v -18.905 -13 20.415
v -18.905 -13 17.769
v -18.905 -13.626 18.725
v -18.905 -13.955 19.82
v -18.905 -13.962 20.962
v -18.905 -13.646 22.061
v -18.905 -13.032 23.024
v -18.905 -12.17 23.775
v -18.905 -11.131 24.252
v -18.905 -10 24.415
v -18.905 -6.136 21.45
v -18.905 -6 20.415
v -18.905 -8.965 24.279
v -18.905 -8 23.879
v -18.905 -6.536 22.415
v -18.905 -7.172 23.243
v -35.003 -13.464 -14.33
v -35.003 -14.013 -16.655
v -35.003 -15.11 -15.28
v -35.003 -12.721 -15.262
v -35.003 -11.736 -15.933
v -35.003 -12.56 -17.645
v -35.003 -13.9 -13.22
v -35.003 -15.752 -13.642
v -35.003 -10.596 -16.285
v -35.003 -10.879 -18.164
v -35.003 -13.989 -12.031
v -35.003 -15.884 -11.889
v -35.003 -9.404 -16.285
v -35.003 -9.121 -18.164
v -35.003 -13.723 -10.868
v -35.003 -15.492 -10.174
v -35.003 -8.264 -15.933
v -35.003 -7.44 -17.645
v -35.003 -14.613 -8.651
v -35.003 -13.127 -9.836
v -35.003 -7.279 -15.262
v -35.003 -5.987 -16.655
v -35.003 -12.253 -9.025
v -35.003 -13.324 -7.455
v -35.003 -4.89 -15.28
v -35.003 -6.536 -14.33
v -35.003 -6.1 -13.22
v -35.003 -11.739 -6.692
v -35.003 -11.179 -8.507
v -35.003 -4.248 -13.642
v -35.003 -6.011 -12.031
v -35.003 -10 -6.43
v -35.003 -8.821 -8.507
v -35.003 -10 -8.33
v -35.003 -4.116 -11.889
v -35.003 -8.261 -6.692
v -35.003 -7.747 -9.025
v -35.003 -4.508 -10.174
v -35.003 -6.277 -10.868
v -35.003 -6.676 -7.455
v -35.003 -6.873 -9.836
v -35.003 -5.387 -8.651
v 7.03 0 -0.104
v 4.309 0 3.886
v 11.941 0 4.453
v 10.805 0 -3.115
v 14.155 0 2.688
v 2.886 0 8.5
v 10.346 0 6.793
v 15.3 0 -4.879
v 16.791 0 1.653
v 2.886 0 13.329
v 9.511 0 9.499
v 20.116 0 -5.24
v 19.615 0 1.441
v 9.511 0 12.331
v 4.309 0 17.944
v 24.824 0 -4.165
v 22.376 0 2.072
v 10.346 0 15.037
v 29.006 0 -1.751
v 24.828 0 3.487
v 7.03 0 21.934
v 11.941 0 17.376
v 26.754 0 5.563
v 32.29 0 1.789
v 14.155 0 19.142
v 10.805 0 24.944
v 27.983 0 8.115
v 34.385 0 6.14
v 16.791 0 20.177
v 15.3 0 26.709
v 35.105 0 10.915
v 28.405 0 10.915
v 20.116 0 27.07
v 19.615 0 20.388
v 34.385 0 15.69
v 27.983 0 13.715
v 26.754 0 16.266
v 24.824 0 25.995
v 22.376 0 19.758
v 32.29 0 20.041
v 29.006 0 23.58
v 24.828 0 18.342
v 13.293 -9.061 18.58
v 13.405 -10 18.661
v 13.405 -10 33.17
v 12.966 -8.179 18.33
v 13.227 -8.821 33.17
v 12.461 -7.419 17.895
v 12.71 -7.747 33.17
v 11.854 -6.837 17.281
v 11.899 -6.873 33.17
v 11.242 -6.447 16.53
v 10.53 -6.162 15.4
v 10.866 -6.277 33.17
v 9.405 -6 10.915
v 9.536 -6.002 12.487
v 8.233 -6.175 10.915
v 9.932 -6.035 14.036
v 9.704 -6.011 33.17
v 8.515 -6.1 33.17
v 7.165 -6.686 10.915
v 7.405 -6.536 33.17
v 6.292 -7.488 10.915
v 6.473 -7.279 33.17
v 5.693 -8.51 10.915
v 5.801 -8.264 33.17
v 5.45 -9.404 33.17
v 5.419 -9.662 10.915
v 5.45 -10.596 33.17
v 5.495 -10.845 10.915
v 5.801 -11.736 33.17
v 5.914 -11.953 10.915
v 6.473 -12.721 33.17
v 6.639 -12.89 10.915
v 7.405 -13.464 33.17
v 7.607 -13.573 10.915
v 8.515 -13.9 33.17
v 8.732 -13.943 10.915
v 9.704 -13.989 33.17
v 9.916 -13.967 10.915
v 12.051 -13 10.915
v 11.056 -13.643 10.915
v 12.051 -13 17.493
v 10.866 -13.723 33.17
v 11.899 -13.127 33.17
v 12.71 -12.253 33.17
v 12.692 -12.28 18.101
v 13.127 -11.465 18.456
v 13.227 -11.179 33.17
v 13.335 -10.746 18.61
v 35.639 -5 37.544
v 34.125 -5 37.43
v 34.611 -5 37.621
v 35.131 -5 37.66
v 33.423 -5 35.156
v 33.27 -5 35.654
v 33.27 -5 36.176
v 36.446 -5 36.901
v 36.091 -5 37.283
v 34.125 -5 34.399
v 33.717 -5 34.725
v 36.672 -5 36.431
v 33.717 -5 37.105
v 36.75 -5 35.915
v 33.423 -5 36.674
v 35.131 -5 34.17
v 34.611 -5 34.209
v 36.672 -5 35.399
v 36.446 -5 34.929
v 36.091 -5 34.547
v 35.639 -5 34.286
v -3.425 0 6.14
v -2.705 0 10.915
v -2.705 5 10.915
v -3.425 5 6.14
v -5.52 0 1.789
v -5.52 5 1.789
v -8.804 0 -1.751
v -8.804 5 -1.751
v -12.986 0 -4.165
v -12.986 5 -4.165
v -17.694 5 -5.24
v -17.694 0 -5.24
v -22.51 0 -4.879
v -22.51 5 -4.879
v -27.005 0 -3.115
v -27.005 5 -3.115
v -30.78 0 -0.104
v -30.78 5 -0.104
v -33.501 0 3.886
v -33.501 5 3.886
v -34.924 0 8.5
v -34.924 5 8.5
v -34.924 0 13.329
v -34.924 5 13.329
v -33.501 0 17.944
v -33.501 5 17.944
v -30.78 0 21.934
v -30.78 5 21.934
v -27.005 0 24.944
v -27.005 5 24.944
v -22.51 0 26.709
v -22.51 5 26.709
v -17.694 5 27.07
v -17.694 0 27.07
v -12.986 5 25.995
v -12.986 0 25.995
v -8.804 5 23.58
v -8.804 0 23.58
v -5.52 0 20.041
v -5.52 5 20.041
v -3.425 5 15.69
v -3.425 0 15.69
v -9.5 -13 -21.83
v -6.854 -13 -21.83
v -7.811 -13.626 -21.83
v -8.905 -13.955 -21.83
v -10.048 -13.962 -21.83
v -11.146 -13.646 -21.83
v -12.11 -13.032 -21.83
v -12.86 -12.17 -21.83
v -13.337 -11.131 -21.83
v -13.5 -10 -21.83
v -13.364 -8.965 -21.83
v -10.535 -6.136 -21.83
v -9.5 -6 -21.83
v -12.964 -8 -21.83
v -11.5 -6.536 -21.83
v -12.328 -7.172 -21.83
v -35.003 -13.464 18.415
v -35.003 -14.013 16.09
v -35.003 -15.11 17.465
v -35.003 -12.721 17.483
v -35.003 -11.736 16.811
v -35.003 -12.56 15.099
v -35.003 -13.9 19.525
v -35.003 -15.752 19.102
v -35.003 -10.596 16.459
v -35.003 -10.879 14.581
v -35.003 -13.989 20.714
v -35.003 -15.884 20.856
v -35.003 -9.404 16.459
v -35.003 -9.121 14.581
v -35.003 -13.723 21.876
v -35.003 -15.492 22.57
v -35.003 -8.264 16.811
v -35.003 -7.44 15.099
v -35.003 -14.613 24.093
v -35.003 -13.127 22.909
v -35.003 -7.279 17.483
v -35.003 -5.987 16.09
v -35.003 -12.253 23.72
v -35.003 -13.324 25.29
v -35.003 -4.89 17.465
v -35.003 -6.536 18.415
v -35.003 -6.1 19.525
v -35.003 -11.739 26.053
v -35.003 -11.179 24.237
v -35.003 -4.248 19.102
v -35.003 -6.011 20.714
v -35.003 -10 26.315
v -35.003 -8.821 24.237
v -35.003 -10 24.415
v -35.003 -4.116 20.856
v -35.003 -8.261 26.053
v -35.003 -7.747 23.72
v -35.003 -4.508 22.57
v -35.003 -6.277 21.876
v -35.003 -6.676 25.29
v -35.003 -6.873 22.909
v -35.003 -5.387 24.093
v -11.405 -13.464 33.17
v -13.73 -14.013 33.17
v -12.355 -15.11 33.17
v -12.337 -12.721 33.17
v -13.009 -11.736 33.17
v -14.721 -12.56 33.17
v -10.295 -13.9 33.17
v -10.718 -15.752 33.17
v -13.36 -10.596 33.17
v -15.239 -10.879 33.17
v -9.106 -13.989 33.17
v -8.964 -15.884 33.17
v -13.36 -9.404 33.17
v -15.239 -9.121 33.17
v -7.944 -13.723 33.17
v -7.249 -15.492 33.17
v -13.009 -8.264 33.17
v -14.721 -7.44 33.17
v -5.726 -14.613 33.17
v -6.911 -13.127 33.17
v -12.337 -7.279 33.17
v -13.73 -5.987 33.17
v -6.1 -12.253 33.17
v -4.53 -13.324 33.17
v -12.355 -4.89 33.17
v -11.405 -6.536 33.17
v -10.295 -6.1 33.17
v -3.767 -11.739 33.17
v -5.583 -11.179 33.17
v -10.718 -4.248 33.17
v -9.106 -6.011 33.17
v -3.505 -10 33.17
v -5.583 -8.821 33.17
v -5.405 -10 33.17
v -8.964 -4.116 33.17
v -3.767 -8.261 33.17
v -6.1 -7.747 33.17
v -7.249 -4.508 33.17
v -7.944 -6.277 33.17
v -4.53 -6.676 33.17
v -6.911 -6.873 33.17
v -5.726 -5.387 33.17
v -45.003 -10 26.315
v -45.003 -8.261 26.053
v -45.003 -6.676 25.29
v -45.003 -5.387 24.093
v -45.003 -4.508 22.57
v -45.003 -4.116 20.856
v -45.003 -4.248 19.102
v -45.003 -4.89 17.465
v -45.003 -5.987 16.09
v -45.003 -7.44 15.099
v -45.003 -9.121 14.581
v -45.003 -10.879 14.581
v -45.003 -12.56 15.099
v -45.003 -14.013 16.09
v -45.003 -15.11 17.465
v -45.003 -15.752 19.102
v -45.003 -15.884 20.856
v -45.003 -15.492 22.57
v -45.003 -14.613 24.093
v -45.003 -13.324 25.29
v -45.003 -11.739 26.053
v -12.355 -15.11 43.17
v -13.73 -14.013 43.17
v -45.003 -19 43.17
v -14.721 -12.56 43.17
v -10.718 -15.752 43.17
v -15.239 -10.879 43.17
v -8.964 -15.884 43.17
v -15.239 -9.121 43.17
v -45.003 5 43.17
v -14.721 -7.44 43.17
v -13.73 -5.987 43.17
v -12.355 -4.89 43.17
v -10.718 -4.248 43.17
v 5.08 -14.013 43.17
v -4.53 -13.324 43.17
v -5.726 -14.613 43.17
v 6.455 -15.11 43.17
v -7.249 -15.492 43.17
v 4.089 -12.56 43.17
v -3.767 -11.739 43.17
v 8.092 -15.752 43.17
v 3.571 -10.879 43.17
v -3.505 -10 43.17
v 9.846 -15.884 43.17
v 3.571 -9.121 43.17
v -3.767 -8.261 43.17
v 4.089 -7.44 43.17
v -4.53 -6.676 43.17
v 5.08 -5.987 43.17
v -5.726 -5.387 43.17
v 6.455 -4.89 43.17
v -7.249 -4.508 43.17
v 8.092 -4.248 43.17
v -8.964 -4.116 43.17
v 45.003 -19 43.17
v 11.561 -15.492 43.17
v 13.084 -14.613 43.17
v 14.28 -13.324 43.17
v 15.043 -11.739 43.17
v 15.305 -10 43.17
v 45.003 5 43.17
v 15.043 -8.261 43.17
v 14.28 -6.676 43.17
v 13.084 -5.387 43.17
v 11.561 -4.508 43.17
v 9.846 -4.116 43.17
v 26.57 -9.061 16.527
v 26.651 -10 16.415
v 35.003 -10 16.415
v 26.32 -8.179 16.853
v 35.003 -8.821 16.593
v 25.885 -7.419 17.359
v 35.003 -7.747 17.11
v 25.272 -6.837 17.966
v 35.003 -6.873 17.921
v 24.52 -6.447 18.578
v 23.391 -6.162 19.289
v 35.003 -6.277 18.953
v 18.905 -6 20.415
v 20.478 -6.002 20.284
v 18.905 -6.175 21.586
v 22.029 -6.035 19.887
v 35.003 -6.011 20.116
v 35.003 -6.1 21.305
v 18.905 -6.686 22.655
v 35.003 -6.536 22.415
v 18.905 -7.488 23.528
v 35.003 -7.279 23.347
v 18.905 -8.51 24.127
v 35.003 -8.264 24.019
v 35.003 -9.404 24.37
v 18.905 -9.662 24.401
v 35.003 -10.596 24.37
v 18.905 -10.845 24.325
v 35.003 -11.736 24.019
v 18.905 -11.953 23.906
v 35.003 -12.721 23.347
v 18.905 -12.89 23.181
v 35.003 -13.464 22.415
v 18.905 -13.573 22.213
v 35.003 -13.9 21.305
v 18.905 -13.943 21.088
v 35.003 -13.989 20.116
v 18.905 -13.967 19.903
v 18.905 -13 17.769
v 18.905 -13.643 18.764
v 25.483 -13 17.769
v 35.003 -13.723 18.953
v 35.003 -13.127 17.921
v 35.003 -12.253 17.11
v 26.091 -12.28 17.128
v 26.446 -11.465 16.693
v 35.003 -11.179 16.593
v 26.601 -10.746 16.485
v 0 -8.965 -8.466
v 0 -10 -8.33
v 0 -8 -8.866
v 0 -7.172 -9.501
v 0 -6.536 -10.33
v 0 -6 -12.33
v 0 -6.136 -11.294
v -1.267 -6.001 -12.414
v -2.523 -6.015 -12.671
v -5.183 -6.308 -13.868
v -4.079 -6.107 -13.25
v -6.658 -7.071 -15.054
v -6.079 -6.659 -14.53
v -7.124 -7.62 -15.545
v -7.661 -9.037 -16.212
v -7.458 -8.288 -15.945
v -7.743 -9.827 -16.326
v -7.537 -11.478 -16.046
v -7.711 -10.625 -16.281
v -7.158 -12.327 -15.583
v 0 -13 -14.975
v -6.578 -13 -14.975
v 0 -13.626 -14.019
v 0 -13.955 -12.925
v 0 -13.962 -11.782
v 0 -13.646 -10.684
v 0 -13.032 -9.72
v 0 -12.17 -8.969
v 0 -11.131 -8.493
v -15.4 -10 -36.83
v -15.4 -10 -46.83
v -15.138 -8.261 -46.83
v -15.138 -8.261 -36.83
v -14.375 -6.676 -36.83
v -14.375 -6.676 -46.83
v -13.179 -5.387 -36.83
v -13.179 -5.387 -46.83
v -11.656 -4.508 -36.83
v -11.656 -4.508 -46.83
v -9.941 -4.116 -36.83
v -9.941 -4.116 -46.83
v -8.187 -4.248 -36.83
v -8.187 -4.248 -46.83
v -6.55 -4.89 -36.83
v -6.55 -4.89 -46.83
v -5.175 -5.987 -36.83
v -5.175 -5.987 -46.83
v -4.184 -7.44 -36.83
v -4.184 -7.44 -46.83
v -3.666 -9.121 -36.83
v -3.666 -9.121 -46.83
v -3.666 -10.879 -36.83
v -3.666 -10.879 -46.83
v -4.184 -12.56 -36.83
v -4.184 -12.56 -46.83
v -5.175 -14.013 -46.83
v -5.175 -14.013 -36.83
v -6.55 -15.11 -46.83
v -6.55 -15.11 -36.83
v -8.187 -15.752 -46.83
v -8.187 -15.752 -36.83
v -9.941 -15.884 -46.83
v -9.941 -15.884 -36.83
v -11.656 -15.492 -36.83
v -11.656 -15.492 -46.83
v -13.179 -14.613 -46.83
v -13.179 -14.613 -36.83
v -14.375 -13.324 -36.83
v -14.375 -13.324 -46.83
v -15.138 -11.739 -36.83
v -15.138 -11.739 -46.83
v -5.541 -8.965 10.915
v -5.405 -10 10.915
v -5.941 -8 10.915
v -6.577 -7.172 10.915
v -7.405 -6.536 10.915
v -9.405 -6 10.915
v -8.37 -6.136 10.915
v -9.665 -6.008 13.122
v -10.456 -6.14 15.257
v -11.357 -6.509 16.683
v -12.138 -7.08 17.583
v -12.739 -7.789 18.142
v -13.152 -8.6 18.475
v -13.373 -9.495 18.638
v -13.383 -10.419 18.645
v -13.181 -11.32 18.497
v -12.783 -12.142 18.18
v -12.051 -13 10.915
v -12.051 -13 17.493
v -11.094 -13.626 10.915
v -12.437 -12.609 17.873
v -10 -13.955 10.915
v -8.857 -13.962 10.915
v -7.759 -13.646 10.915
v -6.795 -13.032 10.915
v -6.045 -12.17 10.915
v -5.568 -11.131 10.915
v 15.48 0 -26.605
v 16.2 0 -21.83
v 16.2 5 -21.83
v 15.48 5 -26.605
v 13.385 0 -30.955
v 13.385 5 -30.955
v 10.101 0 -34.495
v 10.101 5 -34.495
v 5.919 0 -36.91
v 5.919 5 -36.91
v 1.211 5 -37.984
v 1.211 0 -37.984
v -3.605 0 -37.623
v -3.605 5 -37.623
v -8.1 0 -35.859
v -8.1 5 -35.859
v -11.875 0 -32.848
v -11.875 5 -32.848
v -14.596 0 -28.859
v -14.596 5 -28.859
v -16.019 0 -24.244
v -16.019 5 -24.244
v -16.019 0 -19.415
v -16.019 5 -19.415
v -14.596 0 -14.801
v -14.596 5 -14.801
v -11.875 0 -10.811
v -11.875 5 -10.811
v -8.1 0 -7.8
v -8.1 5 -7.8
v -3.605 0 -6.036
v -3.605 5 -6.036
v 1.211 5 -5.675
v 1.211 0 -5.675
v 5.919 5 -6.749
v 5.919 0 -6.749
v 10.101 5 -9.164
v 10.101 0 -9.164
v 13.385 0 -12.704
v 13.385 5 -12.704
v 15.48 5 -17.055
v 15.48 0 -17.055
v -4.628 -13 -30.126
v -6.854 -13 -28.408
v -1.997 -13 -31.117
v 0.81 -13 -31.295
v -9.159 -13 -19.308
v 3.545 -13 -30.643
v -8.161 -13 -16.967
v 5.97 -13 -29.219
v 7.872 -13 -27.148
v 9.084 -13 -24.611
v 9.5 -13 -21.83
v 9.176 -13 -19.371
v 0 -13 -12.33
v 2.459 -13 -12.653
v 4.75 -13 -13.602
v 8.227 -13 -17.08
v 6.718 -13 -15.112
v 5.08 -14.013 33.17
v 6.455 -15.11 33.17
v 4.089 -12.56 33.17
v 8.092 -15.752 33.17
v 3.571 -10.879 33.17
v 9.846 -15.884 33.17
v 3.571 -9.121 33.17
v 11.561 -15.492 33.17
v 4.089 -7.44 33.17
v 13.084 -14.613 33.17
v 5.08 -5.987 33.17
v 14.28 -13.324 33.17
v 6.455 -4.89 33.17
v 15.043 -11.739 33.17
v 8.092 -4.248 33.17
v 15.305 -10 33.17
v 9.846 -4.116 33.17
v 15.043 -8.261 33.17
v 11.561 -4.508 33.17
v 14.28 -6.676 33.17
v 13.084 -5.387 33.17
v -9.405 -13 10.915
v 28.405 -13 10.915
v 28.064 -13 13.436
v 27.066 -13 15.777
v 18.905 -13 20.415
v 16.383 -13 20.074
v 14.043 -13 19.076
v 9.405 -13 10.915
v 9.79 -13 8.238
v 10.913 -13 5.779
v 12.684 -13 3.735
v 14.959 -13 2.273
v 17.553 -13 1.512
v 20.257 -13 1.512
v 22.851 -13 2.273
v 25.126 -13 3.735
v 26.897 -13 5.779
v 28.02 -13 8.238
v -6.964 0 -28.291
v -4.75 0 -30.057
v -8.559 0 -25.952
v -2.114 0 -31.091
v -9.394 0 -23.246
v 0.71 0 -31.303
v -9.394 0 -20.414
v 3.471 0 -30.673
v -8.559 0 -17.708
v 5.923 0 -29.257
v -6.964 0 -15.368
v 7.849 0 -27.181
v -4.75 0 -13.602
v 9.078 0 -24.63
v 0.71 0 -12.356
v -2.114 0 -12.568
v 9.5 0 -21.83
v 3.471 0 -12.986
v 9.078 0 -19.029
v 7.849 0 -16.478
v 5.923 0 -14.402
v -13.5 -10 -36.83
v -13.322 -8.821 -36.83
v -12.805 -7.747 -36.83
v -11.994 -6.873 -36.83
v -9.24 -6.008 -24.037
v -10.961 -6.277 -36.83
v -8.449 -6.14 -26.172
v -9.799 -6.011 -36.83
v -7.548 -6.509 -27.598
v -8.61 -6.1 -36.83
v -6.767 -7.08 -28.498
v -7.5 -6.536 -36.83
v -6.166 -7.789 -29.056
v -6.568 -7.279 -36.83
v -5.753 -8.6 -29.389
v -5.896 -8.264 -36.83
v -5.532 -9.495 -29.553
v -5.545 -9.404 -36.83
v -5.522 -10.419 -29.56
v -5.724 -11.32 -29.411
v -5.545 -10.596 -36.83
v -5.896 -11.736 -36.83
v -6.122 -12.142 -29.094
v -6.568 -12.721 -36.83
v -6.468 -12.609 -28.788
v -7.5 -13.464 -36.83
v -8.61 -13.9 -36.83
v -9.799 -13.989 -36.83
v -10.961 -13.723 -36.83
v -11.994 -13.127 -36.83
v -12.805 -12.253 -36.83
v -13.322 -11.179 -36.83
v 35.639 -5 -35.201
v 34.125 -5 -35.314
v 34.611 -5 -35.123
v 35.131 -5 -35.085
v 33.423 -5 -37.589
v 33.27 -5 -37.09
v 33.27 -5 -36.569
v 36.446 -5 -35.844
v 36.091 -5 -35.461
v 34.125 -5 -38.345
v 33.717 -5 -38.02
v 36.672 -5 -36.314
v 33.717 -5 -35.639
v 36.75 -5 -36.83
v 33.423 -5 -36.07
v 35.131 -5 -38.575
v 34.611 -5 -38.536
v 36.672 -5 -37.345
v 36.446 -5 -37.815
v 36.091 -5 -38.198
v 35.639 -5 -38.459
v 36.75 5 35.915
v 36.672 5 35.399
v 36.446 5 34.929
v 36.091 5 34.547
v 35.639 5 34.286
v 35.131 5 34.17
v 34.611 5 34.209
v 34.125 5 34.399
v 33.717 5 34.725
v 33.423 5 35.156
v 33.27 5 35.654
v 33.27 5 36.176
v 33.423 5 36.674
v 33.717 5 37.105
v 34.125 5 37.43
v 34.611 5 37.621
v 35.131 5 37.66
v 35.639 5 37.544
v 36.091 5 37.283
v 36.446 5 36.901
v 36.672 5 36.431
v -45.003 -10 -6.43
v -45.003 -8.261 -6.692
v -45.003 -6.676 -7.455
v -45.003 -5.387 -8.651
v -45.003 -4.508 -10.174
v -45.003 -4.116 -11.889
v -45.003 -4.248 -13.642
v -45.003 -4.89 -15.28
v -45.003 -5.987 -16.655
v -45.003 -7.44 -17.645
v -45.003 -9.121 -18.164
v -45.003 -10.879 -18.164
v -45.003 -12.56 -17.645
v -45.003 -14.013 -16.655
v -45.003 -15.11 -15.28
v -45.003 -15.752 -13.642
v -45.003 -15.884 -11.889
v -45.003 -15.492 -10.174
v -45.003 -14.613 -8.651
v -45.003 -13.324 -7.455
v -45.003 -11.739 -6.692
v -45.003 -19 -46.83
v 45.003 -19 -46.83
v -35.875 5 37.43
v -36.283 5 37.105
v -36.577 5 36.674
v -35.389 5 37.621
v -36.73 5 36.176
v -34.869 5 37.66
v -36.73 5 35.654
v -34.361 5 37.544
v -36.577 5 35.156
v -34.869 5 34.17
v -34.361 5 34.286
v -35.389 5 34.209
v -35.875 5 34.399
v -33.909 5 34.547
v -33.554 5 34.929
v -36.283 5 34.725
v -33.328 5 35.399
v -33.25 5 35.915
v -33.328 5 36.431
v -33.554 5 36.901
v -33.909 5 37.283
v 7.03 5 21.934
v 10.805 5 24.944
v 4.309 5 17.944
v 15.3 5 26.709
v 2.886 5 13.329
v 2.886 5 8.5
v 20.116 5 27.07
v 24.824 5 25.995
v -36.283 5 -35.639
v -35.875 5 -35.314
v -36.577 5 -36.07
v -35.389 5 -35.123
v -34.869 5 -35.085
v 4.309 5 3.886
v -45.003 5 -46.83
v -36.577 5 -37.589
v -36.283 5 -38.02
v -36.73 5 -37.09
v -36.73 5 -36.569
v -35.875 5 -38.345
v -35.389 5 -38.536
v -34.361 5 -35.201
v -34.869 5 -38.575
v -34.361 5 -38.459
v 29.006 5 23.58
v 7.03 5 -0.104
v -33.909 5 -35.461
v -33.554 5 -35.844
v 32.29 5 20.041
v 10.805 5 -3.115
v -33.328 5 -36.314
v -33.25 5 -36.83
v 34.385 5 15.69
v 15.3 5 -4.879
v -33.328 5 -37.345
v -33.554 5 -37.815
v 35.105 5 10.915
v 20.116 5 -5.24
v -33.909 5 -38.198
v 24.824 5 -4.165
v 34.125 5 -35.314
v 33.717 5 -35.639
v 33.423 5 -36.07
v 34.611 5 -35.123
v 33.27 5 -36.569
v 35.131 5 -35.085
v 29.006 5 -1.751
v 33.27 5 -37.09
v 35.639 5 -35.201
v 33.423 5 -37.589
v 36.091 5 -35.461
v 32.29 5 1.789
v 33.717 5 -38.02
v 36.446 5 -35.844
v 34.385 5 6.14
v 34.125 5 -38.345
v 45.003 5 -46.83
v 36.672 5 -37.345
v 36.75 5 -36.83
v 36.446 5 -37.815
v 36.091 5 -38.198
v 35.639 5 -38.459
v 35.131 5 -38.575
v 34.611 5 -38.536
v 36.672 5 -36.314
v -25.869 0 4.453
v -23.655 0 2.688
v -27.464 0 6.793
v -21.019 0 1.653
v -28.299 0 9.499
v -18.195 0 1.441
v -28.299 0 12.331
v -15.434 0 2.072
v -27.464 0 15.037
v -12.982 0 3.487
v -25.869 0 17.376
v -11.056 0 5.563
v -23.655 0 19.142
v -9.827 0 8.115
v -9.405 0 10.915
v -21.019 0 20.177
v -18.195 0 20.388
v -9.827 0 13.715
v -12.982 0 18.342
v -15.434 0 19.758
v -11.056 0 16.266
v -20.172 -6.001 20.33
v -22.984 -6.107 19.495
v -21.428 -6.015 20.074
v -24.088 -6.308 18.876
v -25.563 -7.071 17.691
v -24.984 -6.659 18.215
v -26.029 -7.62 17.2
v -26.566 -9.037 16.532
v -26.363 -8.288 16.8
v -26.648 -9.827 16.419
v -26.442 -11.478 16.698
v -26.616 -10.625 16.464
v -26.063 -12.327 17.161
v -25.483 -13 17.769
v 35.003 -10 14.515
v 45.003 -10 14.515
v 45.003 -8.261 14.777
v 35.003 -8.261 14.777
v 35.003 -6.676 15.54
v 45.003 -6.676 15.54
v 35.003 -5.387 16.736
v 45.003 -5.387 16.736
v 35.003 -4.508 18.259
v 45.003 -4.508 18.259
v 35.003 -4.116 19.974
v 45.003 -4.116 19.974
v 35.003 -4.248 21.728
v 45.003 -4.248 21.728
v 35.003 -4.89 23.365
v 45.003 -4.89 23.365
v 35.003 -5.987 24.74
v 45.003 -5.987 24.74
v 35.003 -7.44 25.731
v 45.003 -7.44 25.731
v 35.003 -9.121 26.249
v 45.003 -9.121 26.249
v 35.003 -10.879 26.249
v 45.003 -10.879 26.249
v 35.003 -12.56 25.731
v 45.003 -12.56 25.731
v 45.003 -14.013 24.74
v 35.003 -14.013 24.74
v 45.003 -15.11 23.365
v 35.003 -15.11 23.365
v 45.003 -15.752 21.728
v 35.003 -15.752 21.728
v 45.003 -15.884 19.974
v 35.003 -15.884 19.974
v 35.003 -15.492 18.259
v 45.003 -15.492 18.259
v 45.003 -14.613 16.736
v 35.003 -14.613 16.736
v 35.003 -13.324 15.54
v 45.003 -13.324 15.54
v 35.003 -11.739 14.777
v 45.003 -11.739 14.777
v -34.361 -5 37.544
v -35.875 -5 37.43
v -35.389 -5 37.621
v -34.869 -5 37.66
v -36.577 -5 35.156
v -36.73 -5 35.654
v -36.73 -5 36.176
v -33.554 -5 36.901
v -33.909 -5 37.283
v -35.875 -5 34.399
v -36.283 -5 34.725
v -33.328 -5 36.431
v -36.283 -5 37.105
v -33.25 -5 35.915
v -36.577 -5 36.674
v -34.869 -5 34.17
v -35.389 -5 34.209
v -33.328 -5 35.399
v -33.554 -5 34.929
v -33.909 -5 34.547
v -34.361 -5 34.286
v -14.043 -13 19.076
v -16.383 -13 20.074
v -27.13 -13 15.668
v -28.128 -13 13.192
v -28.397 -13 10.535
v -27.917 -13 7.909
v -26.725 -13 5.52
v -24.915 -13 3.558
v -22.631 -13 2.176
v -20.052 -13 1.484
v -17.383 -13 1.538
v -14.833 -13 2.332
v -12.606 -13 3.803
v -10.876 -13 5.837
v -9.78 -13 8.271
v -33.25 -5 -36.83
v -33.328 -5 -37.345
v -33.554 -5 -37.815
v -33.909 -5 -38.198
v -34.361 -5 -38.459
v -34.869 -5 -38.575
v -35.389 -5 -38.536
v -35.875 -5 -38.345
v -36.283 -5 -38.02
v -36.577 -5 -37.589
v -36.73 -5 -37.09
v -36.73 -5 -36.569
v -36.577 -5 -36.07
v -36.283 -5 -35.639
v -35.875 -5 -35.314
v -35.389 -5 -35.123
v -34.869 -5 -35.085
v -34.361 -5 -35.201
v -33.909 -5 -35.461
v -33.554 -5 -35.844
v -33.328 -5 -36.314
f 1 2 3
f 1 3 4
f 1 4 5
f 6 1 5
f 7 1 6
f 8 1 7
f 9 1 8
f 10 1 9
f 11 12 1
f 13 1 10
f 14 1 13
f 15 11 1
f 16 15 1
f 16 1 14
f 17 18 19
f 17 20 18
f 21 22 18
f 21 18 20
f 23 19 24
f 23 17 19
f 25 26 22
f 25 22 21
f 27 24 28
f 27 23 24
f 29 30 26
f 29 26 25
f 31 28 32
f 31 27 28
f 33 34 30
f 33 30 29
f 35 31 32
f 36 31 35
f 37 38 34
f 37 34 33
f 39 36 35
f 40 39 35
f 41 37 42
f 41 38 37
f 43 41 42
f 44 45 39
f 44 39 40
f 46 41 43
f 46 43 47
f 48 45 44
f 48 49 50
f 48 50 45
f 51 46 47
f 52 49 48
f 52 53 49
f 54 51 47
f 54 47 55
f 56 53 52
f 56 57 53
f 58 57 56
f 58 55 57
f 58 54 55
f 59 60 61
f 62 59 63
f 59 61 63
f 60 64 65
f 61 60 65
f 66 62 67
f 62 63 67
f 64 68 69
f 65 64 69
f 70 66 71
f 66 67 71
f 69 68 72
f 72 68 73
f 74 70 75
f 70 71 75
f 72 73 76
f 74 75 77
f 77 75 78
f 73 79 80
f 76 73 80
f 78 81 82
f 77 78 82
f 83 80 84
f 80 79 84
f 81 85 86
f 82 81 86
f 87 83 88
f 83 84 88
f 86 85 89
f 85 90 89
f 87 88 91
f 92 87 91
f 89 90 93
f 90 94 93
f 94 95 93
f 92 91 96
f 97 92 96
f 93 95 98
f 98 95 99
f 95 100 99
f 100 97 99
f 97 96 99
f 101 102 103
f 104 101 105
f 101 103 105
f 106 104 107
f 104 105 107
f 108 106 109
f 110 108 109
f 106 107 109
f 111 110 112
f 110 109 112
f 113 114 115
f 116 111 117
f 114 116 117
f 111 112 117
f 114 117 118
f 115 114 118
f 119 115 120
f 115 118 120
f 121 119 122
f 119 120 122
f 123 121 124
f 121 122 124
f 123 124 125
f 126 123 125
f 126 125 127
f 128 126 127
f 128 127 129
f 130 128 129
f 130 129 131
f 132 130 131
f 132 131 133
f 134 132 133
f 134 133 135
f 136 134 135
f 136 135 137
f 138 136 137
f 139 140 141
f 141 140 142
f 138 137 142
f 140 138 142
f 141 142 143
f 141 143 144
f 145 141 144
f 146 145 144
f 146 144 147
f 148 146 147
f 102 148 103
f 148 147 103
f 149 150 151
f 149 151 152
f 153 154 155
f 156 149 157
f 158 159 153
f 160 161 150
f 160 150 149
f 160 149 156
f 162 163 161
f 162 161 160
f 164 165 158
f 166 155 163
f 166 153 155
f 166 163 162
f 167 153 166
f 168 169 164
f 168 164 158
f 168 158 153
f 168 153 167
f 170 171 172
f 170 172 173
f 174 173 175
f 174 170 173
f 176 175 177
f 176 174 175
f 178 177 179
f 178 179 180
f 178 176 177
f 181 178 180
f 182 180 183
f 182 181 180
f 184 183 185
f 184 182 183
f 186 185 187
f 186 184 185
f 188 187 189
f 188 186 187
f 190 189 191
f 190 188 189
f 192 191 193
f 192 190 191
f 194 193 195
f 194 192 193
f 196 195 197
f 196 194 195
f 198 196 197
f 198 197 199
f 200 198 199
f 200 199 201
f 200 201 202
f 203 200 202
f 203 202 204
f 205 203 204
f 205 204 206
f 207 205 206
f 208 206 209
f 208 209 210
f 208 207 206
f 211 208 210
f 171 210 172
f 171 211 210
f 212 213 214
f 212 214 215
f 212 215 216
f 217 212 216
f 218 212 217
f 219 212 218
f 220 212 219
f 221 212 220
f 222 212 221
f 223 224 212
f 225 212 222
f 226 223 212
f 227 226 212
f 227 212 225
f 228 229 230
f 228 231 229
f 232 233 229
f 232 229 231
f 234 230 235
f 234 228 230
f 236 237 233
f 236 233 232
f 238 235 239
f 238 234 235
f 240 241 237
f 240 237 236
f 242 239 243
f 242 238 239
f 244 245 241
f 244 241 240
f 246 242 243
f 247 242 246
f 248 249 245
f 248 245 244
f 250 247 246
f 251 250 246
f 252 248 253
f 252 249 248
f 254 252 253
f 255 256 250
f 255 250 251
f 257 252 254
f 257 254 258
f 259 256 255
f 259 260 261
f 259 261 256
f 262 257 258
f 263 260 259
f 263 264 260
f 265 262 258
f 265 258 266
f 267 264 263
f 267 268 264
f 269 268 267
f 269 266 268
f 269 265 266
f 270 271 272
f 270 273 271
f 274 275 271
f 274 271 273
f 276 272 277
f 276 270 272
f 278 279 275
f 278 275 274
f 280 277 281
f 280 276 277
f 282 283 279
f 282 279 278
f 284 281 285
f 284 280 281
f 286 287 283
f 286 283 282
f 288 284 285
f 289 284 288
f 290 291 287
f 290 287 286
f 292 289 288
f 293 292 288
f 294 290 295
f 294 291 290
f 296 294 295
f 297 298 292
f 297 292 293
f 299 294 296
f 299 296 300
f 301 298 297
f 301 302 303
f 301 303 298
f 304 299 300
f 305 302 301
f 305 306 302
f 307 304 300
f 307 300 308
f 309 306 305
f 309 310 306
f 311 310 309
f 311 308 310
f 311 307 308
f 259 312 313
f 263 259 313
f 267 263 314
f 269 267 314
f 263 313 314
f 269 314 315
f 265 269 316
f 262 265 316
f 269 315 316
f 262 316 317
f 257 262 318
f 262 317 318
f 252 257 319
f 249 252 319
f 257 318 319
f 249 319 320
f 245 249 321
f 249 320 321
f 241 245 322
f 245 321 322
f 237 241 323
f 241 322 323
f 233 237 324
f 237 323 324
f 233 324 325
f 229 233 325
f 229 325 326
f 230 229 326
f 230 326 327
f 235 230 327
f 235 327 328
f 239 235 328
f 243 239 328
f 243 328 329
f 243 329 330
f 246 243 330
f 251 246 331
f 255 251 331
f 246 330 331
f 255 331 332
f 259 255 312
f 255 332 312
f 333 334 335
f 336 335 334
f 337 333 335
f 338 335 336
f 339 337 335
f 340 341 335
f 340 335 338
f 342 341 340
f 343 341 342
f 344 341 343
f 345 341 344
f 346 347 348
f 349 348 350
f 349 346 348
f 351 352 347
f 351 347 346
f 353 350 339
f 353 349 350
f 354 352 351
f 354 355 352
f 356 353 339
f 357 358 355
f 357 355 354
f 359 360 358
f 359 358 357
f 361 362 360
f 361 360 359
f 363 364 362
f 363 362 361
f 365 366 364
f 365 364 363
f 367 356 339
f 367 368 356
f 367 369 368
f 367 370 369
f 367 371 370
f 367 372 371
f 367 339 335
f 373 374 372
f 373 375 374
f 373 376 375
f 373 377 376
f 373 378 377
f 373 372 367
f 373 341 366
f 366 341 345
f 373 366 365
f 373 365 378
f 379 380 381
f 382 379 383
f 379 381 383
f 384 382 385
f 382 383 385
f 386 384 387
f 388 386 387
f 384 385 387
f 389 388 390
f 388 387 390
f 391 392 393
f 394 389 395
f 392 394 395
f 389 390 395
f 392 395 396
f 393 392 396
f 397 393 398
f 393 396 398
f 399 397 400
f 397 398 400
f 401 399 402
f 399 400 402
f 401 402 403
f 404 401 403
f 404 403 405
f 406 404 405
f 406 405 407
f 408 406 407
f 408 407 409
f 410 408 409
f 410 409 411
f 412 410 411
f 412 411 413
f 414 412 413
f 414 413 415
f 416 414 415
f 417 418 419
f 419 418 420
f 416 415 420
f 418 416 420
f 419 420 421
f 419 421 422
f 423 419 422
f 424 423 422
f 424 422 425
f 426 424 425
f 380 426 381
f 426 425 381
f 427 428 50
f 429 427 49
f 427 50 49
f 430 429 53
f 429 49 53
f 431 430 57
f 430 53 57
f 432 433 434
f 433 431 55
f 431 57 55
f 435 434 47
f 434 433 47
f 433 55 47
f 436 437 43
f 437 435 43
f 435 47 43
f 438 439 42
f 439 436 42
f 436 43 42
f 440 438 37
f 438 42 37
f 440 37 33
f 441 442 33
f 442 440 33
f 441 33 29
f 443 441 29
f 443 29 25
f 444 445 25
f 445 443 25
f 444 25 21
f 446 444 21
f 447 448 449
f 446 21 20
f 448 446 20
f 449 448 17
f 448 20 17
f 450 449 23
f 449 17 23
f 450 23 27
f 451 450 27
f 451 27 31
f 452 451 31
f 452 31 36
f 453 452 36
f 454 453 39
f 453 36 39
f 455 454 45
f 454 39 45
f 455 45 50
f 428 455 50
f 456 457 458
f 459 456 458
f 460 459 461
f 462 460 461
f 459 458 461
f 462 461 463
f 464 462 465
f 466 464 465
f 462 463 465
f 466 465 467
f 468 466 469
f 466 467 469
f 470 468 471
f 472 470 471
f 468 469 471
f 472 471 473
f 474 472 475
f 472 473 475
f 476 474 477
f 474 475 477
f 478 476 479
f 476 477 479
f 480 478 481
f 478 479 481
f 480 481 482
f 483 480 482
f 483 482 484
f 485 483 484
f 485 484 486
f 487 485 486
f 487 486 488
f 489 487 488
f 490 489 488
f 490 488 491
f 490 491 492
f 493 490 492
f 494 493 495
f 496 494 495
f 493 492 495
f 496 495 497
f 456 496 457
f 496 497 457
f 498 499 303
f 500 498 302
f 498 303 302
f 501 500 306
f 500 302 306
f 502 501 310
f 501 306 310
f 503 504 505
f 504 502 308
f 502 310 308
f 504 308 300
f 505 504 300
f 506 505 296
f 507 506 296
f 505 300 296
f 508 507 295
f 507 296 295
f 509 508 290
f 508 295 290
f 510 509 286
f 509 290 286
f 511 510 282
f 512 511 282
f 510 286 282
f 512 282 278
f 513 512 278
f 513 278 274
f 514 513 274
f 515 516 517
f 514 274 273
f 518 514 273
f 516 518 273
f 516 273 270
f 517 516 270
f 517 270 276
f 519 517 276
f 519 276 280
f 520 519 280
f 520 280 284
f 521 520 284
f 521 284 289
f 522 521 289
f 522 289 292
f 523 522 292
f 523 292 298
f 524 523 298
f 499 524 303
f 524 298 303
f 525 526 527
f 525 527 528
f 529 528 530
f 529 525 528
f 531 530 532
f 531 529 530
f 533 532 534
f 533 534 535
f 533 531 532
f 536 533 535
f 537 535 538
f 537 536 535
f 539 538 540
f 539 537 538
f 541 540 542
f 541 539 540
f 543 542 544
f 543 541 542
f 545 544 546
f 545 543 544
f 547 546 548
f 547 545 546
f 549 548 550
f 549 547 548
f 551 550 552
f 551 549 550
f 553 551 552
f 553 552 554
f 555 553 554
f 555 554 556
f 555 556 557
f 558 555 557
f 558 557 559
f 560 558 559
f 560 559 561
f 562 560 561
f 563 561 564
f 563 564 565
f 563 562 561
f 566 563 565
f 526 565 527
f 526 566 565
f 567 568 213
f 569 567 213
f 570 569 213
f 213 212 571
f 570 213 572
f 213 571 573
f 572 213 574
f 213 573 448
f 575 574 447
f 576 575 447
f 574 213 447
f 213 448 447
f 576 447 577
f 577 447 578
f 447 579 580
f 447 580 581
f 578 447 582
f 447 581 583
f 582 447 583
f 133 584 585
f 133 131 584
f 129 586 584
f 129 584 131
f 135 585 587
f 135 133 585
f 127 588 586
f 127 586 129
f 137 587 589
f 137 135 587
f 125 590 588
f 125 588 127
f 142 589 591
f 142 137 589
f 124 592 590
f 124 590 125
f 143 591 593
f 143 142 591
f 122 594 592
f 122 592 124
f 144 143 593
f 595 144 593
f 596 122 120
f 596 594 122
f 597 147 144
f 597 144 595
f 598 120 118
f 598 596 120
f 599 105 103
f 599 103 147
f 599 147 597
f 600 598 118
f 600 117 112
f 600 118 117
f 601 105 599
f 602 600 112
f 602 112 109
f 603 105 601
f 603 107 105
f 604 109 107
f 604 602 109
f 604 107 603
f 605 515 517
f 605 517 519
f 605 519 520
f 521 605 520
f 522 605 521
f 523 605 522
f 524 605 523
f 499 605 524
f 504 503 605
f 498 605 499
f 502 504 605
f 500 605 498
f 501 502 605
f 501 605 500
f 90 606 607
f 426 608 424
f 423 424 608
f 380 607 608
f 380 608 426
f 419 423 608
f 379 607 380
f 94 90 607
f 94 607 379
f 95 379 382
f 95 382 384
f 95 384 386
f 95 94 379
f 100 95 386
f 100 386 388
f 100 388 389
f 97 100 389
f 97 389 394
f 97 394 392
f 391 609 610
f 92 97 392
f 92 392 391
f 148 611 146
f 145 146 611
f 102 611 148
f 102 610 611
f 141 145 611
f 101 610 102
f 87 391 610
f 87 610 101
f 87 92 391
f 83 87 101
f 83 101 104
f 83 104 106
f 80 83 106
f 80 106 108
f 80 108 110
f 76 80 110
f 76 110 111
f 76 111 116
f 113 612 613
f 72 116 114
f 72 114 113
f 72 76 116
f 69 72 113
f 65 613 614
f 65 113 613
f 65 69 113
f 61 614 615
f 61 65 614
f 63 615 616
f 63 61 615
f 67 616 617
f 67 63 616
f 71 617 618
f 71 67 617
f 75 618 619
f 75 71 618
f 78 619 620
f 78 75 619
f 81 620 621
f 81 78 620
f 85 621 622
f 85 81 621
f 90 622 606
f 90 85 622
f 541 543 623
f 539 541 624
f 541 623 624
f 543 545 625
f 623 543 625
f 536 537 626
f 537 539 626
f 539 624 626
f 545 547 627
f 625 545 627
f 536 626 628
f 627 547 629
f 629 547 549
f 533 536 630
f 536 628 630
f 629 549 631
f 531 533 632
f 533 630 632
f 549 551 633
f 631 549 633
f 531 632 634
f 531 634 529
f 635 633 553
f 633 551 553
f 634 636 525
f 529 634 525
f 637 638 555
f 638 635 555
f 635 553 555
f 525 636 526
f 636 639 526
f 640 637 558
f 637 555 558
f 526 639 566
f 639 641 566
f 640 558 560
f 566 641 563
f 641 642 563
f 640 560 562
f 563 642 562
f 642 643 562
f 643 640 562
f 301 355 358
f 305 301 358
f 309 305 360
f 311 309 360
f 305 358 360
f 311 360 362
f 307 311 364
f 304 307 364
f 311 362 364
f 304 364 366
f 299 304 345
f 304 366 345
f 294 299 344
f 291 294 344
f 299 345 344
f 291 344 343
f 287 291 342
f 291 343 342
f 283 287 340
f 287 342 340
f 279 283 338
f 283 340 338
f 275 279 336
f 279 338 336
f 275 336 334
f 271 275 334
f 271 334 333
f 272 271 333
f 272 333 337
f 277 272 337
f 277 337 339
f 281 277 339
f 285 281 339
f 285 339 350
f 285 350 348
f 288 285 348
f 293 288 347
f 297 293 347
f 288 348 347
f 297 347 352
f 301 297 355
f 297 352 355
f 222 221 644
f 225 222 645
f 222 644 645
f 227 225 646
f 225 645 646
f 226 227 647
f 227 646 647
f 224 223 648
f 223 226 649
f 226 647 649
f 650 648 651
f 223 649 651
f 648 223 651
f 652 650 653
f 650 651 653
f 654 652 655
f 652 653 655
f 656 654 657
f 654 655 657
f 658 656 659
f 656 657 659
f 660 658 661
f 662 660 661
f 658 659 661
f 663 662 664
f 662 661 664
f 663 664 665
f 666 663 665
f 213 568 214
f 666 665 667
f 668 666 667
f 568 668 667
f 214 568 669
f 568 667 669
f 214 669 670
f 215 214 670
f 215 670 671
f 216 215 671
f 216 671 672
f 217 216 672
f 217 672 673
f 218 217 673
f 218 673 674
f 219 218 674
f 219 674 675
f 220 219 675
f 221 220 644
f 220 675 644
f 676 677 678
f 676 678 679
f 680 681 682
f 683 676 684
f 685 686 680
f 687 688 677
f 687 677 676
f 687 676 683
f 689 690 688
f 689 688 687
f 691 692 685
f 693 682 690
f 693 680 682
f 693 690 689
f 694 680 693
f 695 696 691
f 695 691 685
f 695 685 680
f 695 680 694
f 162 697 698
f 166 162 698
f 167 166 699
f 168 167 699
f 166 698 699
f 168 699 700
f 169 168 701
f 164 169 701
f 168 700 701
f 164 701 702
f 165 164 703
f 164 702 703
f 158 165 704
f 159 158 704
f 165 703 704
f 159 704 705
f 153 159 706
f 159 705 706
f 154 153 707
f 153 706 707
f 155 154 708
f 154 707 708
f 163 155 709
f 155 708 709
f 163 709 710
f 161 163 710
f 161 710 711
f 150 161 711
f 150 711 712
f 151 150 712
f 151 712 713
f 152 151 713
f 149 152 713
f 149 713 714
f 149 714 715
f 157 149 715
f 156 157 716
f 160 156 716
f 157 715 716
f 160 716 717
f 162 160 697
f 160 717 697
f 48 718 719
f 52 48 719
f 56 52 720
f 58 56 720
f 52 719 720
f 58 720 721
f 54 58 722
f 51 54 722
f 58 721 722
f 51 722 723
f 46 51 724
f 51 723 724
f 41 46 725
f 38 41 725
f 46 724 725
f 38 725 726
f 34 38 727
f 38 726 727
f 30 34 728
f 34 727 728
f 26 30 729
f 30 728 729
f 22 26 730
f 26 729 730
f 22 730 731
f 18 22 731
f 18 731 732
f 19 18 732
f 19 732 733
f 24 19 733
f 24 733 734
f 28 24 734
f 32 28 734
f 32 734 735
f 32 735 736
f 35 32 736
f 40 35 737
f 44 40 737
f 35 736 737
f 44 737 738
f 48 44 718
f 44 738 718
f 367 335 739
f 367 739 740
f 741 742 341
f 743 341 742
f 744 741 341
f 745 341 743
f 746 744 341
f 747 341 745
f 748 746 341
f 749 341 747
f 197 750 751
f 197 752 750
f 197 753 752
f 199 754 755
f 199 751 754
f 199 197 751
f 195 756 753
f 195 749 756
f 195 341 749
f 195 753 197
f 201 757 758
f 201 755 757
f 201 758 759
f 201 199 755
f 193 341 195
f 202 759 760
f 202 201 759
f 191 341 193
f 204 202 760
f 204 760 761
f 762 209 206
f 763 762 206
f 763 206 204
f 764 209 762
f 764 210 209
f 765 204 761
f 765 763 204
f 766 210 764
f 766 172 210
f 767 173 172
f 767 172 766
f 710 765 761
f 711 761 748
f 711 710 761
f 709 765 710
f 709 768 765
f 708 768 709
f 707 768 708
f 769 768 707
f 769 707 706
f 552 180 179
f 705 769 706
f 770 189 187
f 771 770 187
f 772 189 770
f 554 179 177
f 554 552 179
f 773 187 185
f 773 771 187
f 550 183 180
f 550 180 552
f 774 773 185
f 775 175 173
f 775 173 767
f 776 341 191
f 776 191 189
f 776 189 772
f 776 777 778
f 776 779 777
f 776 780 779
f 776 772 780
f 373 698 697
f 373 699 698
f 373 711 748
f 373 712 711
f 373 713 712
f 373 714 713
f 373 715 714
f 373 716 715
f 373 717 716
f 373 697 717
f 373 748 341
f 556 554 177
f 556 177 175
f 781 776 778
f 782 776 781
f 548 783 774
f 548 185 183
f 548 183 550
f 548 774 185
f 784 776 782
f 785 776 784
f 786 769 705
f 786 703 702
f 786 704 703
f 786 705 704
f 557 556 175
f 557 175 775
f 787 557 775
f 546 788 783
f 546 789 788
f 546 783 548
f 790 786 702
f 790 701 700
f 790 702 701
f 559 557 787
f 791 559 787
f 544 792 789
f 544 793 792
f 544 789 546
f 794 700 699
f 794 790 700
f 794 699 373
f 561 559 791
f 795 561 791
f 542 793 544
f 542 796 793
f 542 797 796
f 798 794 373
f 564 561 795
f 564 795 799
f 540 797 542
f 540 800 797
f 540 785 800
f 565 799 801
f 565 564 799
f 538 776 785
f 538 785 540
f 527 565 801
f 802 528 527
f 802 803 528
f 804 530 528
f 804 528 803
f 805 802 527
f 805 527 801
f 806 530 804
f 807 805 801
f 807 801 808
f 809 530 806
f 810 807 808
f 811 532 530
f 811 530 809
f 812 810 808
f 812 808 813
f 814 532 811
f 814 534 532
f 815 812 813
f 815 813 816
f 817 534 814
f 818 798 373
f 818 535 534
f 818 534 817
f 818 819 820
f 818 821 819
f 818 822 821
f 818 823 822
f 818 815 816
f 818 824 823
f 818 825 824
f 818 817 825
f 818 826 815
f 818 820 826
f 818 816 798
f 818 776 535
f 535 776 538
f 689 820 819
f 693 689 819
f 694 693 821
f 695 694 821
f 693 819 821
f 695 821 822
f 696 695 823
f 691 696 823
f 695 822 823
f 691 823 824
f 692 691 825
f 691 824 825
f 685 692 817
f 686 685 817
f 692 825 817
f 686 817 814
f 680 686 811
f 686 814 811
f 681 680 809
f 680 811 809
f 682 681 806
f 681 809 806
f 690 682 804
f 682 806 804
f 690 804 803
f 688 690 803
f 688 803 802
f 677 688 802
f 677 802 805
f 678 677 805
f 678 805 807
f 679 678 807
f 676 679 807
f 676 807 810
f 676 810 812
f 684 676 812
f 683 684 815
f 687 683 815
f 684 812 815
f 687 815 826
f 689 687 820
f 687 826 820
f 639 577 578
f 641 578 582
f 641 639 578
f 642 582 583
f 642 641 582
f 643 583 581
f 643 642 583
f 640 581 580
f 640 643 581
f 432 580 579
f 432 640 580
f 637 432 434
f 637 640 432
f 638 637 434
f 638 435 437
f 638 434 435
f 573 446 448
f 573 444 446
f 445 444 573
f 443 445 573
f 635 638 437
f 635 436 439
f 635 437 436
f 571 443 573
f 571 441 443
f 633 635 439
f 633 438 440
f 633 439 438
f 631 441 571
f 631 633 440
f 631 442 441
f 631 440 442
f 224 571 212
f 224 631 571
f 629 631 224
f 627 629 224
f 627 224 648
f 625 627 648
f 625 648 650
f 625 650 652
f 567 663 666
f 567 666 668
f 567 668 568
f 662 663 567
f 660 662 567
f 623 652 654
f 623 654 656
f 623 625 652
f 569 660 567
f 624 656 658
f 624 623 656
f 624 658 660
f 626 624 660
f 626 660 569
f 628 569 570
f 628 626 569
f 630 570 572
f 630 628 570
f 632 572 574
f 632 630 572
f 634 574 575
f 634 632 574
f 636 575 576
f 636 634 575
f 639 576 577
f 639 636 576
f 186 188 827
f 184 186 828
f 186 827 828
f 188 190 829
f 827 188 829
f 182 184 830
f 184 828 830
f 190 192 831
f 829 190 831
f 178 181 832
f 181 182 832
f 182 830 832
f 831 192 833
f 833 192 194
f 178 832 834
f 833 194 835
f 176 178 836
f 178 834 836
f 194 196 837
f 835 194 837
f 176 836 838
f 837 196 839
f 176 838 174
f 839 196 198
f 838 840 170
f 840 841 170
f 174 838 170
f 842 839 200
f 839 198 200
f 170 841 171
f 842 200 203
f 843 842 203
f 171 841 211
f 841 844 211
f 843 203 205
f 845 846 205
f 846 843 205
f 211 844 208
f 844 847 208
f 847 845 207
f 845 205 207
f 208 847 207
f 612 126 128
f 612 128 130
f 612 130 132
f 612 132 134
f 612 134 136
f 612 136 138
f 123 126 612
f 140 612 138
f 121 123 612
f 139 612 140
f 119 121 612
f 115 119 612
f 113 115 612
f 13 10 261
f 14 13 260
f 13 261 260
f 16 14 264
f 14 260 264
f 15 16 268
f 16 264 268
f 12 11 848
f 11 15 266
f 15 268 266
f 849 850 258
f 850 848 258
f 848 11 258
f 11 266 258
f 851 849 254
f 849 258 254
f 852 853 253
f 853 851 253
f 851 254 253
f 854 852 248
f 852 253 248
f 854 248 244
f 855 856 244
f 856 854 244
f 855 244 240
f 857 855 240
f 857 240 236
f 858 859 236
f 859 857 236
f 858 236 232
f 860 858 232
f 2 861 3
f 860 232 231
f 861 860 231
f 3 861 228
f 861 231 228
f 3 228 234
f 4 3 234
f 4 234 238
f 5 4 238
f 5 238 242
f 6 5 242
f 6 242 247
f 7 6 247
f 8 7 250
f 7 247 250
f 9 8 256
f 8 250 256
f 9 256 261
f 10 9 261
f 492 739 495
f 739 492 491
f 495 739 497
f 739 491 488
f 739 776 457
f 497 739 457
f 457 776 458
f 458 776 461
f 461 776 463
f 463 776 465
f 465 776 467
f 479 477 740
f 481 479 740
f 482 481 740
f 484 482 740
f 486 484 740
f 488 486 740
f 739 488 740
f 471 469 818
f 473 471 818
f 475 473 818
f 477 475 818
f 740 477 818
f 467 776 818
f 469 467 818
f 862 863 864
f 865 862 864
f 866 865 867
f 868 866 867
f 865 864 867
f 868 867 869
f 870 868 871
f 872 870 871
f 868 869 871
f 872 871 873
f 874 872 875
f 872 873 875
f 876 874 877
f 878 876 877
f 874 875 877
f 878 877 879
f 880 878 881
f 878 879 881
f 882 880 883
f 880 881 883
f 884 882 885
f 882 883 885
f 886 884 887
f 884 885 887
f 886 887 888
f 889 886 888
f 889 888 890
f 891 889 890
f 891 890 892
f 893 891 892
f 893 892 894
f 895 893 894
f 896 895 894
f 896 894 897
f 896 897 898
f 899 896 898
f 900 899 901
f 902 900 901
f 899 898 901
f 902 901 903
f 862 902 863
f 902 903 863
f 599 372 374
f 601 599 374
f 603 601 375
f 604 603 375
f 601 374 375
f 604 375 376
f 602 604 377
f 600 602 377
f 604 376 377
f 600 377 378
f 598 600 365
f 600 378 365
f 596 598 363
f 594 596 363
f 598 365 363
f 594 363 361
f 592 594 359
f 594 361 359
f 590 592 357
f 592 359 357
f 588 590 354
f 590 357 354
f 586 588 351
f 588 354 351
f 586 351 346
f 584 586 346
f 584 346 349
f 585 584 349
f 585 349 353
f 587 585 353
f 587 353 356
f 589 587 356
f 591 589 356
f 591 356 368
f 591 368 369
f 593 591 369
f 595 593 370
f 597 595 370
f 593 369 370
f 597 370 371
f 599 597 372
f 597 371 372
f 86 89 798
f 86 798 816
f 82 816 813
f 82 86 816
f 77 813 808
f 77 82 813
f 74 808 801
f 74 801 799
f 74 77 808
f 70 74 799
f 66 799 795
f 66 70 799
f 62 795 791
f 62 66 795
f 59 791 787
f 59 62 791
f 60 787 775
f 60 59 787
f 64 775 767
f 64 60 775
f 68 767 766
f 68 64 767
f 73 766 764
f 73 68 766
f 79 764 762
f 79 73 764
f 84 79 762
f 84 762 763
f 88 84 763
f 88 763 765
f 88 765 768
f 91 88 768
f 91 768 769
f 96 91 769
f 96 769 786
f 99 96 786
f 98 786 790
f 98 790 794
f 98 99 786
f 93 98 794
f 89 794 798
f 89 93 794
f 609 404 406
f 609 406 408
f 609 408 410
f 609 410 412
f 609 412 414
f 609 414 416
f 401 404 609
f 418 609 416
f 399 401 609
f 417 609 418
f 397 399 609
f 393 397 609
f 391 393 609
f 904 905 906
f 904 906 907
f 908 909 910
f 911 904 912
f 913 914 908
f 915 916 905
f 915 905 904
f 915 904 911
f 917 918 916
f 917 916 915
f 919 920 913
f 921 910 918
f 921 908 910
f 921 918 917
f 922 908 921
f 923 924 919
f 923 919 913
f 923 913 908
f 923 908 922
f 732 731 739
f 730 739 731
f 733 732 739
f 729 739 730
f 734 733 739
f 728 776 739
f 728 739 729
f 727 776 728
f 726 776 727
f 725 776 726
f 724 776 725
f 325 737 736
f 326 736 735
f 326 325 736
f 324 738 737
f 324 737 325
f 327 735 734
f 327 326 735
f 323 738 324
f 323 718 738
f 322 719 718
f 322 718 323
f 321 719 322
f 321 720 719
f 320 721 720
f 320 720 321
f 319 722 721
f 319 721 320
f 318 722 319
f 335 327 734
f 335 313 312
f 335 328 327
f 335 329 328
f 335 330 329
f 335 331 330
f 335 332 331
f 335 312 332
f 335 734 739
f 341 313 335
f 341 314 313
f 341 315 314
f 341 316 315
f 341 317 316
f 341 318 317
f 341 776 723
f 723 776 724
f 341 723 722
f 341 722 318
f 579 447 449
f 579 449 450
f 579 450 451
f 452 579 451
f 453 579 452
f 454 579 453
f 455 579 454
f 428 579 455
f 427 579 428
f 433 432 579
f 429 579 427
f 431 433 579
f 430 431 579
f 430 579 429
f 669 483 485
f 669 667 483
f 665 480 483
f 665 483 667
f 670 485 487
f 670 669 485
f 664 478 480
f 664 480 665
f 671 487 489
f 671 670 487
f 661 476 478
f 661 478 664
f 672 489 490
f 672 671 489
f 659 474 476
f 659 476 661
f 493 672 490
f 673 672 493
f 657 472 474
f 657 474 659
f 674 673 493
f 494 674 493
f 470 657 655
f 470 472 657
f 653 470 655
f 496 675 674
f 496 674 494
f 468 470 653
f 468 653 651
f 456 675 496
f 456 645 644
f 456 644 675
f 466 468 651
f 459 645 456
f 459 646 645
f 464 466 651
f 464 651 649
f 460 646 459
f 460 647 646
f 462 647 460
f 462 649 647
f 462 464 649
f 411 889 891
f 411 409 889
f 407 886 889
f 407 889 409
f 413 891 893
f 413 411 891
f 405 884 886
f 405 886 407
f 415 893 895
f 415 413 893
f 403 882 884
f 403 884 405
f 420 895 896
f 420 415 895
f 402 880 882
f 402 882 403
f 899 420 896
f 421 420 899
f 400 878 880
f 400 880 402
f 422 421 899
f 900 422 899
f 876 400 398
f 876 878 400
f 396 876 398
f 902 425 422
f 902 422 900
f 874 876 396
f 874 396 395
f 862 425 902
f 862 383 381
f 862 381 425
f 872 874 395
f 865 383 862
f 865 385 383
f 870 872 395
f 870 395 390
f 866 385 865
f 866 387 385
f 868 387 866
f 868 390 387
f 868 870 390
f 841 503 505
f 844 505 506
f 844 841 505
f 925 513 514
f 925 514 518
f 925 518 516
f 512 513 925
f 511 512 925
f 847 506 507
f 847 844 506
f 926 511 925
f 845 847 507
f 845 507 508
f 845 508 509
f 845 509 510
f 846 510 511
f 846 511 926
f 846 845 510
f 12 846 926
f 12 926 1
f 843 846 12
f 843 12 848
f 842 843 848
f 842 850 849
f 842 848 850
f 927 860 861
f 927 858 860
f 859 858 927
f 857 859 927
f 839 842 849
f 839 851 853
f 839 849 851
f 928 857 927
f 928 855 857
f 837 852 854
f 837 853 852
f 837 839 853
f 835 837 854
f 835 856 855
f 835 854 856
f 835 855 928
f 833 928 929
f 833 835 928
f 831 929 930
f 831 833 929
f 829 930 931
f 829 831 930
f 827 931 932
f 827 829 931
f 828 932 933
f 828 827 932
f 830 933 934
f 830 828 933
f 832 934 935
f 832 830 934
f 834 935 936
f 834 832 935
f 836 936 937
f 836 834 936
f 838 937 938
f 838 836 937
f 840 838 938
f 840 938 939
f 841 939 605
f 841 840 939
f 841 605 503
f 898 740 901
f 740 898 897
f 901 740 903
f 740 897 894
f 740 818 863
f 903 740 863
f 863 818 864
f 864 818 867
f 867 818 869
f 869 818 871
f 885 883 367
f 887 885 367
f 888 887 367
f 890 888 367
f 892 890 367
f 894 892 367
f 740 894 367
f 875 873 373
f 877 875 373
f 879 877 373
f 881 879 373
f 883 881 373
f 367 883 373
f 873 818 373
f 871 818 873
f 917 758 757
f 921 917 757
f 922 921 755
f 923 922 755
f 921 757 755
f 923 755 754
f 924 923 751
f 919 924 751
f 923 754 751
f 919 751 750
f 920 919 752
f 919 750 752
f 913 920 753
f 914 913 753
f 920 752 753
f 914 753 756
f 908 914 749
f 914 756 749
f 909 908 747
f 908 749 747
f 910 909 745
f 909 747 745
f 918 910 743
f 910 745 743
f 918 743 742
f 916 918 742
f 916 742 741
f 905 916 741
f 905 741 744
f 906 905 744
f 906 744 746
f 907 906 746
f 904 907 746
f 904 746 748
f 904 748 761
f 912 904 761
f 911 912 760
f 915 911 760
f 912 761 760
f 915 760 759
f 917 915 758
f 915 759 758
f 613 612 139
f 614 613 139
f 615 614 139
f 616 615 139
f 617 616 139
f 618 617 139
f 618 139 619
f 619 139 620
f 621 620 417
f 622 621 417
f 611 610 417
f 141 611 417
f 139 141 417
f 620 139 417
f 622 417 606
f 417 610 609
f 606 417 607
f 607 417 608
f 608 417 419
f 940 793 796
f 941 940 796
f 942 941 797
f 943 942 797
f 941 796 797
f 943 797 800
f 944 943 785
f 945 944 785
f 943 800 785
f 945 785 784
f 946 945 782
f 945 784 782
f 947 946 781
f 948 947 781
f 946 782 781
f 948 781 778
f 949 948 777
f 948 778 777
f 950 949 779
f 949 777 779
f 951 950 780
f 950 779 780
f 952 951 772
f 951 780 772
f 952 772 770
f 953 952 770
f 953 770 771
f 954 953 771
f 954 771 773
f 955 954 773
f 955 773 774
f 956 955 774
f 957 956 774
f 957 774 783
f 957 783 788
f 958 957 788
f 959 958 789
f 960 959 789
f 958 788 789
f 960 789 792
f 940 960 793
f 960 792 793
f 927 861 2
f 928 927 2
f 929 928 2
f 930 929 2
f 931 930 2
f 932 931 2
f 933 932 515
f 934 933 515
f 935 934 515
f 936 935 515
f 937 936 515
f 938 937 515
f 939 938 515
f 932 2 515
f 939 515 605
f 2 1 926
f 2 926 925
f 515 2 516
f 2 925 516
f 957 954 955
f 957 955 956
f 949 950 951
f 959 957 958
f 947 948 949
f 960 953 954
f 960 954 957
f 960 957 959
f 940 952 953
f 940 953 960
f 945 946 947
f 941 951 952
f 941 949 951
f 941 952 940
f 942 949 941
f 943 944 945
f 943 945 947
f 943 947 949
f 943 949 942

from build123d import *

# Parameters (mm, degrees)
SKETCH1_W                = 90.006
SKETCH1_H                = 90
SKETCH1_R                = 16.2
ALPHASENSE_HOUSING_DEPTH = 5
SKETCH2_W                = 90.006
SKETCH2_H                = 90
SKETCH2_R                = 9.5
CHAMBER_HOUSING_DEPTH    = 13
SKETCH3_W                = 90.006
SKETCH3_H                = 90
BASE_DEPTH               = 6
SKETCH5_R                = 5.9
DRILL_DEPTH              = 10
SKETCH6_R                = 5.9
DRILL2_DEPTH             = 10
SKETCH7_R                = 5.9
DRILL3_DEPTH             = 10
SKETCH8_R                = 5.9
INLETDRILL_DEPTH         = 10
SKETCH10_R               = 5.9
DRILL5_DEPTH             = 10
SKETCH11_R               = 5.9
OUTLEDRILL_DEPTH         = 10
SKETCH12_R               = 1.75
CLIPPINGTHREADS_DEPTH    = 10
SKETCH13_R               = 4
CUT_EXTRUDE1_DEPTH       = 35.003
SKETCH14_R               = 4
CUT_EXTRUDE2_DEPTH       = 16.098
SKETCH15_R               = 4
CUT_EXTRUDE3_DEPTH       = 22.255579
SKETCH16_R               = 4
CUT_EXTRUDE4_DEPTH       = 22.255579
SKETCH17_R               = 4
CUT_EXTRUDE5_DEPTH       = 16.098
SKETCH18_R               = 4
CUT_EXTRUDE6_DEPTH       = 15


with BuildPart() as part:
    # Sketch1 → Alphasense_housing (new body)
    with BuildSketch(Plane(origin=(0, 0, 0), x_dir=(1, 0, 0), z_dir=(0, 1, 0))):
        with Locations((0, 1.829613678)):
            Rectangle(SKETCH1_W, SKETCH1_H)
        with Locations((0, 21.829613678)):
            Circle(SKETCH1_R, mode=Mode.SUBTRACT)
        with Locations((-18.905, -10.914806839)):
            Circle(SKETCH1_R, mode=Mode.SUBTRACT)
        with Locations((18.905, -10.914806839)):
            Circle(SKETCH1_R, mode=Mode.SUBTRACT)
    extrude(amount=ALPHASENSE_HOUSING_DEPTH)

    # Sketch2 → Chamber_housing (add)
    with BuildSketch(Plane.XZ):
        with Locations((0, -1.829613678)):
            Rectangle(SKETCH2_W, SKETCH2_H)
        with Locations((-18.905, 10.914806839)):
            Circle(SKETCH2_R, mode=Mode.SUBTRACT)
        with Locations((18.905, 10.914806839)):
            Circle(SKETCH2_R, mode=Mode.SUBTRACT)
        with Locations((0, -21.829613678)):
            Circle(SKETCH2_R, mode=Mode.SUBTRACT)
    extrude(amount=CHAMBER_HOUSING_DEPTH)

    # Sketch3 → Base (add)
    with BuildSketch(Plane.XZ.offset(13)):
        with Locations((0, -1.829613678)):
            Rectangle(SKETCH3_W, SKETCH3_H)
    extrude(amount=BASE_DEPTH)

    # Sketch5 → Drill (cut)
    with BuildSketch(Plane.ZY.offset(45.003)):
        with Locations((20.414806839, -10)):
            Circle(SKETCH5_R)
    extrude(amount=-DRILL_DEPTH, mode=Mode.SUBTRACT)

    # Sketch6 → Drill2 (cut)
    with BuildSketch(Plane.XY.offset(43.170386322)):
        with Locations((-9.405, -10)):
            Circle(SKETCH6_R)
    extrude(amount=-DRILL2_DEPTH, mode=Mode.SUBTRACT)

    # Sketch7 → Drill3 (cut)
    with BuildSketch(Plane.XY.offset(43.170386322)):
        with Locations((9.405, -10)):
            Circle(SKETCH7_R)
    extrude(amount=-DRILL3_DEPTH, mode=Mode.SUBTRACT)

    # Sketch8 → InletDrill (cut)
    with BuildSketch(Plane(origin=(45.003, 0, 0), x_dir=(0, 0, -1), z_dir=(1, 0, 0))):
        with Locations((-20.414806839, -10)):
            Circle(SKETCH8_R)
    extrude(amount=-INLETDRILL_DEPTH, mode=Mode.SUBTRACT)

    # Sketch10 → Drill5 (cut)
    with BuildSketch(Plane.ZY.offset(45.003)):
        with Locations((-12.329613678, -10)):
            Circle(SKETCH10_R)
    extrude(amount=-DRILL5_DEPTH, mode=Mode.SUBTRACT)

    # Sketch11 → OutleDrill (cut)
    with BuildSketch(Plane(origin=(0, 0, -46.829613678), x_dir=(-1, 0, 0), z_dir=(0, 0, -1))):
        with Locations((9.5, -10)):
            Circle(SKETCH11_R)
    extrude(amount=-OUTLEDRILL_DEPTH, mode=Mode.SUBTRACT)

    # Sketch12 → ClippingThreads (cut)
    with BuildSketch(Plane(origin=(0, 5, 0), x_dir=(1, 0, 0), z_dir=(0, 1, 0))):
        with Locations((-35, 36.829613678)):
            Circle(SKETCH12_R)
        with Locations((35, 36.829613678)):
            Circle(SKETCH12_R)
        with Locations((-35, -35.914806839)):
            Circle(SKETCH12_R)
        with Locations((35, -35.914806839)):
            Circle(SKETCH12_R)
    extrude(amount=-CLIPPINGTHREADS_DEPTH, mode=Mode.SUBTRACT)

    # Sketch13 → Cut-Extrude1 (cut)
    with BuildSketch(Plane.ZY.offset(35.003)):
        with Locations((-12.329613678, -10)):
            Circle(SKETCH13_R)
    extrude(amount=-CUT_EXTRUDE1_DEPTH, mode=Mode.SUBTRACT)

    # Sketch14 → Cut-Extrude2 (cut)
    with BuildSketch(Plane.ZY.offset(35.003)):
        with Locations((20.414806839, -10)):
            Circle(SKETCH14_R)
    extrude(amount=-CUT_EXTRUDE2_DEPTH, mode=Mode.SUBTRACT)

    # Sketch15 → Cut-Extrude3 (cut)
    with BuildSketch(Plane.XY.offset(33.170386322)):
        with Locations((-9.405, -10)):
            Circle(SKETCH15_R)
    extrude(amount=-CUT_EXTRUDE3_DEPTH, mode=Mode.SUBTRACT)

    # Sketch16 → Cut-Extrude4 (cut)
    with BuildSketch(Plane.XY.offset(33.170386322)):
        with Locations((9.405, -10)):
            Circle(SKETCH16_R)
    extrude(amount=-CUT_EXTRUDE4_DEPTH, mode=Mode.SUBTRACT)

    # Sketch17 → Cut-Extrude5 (cut)
    with BuildSketch(Plane(origin=(35.003, 0, 0), x_dir=(0, 0, -1), z_dir=(1, 0, 0))):
        with Locations((-20.414806839, -10)):
            Circle(SKETCH17_R)
    extrude(amount=-CUT_EXTRUDE5_DEPTH, mode=Mode.SUBTRACT)

    # Sketch18 → Cut-Extrude6 (cut)
    with BuildSketch(Plane(origin=(0, 0, -36.829613678), x_dir=(-1, 0, 0), z_dir=(0, 0, -1))):
        with Locations((9.5, -10)):
            Circle(SKETCH18_R)
    extrude(amount=-CUT_EXTRUDE6_DEPTH, mode=Mode.SUBTRACT)


solid = part.part
